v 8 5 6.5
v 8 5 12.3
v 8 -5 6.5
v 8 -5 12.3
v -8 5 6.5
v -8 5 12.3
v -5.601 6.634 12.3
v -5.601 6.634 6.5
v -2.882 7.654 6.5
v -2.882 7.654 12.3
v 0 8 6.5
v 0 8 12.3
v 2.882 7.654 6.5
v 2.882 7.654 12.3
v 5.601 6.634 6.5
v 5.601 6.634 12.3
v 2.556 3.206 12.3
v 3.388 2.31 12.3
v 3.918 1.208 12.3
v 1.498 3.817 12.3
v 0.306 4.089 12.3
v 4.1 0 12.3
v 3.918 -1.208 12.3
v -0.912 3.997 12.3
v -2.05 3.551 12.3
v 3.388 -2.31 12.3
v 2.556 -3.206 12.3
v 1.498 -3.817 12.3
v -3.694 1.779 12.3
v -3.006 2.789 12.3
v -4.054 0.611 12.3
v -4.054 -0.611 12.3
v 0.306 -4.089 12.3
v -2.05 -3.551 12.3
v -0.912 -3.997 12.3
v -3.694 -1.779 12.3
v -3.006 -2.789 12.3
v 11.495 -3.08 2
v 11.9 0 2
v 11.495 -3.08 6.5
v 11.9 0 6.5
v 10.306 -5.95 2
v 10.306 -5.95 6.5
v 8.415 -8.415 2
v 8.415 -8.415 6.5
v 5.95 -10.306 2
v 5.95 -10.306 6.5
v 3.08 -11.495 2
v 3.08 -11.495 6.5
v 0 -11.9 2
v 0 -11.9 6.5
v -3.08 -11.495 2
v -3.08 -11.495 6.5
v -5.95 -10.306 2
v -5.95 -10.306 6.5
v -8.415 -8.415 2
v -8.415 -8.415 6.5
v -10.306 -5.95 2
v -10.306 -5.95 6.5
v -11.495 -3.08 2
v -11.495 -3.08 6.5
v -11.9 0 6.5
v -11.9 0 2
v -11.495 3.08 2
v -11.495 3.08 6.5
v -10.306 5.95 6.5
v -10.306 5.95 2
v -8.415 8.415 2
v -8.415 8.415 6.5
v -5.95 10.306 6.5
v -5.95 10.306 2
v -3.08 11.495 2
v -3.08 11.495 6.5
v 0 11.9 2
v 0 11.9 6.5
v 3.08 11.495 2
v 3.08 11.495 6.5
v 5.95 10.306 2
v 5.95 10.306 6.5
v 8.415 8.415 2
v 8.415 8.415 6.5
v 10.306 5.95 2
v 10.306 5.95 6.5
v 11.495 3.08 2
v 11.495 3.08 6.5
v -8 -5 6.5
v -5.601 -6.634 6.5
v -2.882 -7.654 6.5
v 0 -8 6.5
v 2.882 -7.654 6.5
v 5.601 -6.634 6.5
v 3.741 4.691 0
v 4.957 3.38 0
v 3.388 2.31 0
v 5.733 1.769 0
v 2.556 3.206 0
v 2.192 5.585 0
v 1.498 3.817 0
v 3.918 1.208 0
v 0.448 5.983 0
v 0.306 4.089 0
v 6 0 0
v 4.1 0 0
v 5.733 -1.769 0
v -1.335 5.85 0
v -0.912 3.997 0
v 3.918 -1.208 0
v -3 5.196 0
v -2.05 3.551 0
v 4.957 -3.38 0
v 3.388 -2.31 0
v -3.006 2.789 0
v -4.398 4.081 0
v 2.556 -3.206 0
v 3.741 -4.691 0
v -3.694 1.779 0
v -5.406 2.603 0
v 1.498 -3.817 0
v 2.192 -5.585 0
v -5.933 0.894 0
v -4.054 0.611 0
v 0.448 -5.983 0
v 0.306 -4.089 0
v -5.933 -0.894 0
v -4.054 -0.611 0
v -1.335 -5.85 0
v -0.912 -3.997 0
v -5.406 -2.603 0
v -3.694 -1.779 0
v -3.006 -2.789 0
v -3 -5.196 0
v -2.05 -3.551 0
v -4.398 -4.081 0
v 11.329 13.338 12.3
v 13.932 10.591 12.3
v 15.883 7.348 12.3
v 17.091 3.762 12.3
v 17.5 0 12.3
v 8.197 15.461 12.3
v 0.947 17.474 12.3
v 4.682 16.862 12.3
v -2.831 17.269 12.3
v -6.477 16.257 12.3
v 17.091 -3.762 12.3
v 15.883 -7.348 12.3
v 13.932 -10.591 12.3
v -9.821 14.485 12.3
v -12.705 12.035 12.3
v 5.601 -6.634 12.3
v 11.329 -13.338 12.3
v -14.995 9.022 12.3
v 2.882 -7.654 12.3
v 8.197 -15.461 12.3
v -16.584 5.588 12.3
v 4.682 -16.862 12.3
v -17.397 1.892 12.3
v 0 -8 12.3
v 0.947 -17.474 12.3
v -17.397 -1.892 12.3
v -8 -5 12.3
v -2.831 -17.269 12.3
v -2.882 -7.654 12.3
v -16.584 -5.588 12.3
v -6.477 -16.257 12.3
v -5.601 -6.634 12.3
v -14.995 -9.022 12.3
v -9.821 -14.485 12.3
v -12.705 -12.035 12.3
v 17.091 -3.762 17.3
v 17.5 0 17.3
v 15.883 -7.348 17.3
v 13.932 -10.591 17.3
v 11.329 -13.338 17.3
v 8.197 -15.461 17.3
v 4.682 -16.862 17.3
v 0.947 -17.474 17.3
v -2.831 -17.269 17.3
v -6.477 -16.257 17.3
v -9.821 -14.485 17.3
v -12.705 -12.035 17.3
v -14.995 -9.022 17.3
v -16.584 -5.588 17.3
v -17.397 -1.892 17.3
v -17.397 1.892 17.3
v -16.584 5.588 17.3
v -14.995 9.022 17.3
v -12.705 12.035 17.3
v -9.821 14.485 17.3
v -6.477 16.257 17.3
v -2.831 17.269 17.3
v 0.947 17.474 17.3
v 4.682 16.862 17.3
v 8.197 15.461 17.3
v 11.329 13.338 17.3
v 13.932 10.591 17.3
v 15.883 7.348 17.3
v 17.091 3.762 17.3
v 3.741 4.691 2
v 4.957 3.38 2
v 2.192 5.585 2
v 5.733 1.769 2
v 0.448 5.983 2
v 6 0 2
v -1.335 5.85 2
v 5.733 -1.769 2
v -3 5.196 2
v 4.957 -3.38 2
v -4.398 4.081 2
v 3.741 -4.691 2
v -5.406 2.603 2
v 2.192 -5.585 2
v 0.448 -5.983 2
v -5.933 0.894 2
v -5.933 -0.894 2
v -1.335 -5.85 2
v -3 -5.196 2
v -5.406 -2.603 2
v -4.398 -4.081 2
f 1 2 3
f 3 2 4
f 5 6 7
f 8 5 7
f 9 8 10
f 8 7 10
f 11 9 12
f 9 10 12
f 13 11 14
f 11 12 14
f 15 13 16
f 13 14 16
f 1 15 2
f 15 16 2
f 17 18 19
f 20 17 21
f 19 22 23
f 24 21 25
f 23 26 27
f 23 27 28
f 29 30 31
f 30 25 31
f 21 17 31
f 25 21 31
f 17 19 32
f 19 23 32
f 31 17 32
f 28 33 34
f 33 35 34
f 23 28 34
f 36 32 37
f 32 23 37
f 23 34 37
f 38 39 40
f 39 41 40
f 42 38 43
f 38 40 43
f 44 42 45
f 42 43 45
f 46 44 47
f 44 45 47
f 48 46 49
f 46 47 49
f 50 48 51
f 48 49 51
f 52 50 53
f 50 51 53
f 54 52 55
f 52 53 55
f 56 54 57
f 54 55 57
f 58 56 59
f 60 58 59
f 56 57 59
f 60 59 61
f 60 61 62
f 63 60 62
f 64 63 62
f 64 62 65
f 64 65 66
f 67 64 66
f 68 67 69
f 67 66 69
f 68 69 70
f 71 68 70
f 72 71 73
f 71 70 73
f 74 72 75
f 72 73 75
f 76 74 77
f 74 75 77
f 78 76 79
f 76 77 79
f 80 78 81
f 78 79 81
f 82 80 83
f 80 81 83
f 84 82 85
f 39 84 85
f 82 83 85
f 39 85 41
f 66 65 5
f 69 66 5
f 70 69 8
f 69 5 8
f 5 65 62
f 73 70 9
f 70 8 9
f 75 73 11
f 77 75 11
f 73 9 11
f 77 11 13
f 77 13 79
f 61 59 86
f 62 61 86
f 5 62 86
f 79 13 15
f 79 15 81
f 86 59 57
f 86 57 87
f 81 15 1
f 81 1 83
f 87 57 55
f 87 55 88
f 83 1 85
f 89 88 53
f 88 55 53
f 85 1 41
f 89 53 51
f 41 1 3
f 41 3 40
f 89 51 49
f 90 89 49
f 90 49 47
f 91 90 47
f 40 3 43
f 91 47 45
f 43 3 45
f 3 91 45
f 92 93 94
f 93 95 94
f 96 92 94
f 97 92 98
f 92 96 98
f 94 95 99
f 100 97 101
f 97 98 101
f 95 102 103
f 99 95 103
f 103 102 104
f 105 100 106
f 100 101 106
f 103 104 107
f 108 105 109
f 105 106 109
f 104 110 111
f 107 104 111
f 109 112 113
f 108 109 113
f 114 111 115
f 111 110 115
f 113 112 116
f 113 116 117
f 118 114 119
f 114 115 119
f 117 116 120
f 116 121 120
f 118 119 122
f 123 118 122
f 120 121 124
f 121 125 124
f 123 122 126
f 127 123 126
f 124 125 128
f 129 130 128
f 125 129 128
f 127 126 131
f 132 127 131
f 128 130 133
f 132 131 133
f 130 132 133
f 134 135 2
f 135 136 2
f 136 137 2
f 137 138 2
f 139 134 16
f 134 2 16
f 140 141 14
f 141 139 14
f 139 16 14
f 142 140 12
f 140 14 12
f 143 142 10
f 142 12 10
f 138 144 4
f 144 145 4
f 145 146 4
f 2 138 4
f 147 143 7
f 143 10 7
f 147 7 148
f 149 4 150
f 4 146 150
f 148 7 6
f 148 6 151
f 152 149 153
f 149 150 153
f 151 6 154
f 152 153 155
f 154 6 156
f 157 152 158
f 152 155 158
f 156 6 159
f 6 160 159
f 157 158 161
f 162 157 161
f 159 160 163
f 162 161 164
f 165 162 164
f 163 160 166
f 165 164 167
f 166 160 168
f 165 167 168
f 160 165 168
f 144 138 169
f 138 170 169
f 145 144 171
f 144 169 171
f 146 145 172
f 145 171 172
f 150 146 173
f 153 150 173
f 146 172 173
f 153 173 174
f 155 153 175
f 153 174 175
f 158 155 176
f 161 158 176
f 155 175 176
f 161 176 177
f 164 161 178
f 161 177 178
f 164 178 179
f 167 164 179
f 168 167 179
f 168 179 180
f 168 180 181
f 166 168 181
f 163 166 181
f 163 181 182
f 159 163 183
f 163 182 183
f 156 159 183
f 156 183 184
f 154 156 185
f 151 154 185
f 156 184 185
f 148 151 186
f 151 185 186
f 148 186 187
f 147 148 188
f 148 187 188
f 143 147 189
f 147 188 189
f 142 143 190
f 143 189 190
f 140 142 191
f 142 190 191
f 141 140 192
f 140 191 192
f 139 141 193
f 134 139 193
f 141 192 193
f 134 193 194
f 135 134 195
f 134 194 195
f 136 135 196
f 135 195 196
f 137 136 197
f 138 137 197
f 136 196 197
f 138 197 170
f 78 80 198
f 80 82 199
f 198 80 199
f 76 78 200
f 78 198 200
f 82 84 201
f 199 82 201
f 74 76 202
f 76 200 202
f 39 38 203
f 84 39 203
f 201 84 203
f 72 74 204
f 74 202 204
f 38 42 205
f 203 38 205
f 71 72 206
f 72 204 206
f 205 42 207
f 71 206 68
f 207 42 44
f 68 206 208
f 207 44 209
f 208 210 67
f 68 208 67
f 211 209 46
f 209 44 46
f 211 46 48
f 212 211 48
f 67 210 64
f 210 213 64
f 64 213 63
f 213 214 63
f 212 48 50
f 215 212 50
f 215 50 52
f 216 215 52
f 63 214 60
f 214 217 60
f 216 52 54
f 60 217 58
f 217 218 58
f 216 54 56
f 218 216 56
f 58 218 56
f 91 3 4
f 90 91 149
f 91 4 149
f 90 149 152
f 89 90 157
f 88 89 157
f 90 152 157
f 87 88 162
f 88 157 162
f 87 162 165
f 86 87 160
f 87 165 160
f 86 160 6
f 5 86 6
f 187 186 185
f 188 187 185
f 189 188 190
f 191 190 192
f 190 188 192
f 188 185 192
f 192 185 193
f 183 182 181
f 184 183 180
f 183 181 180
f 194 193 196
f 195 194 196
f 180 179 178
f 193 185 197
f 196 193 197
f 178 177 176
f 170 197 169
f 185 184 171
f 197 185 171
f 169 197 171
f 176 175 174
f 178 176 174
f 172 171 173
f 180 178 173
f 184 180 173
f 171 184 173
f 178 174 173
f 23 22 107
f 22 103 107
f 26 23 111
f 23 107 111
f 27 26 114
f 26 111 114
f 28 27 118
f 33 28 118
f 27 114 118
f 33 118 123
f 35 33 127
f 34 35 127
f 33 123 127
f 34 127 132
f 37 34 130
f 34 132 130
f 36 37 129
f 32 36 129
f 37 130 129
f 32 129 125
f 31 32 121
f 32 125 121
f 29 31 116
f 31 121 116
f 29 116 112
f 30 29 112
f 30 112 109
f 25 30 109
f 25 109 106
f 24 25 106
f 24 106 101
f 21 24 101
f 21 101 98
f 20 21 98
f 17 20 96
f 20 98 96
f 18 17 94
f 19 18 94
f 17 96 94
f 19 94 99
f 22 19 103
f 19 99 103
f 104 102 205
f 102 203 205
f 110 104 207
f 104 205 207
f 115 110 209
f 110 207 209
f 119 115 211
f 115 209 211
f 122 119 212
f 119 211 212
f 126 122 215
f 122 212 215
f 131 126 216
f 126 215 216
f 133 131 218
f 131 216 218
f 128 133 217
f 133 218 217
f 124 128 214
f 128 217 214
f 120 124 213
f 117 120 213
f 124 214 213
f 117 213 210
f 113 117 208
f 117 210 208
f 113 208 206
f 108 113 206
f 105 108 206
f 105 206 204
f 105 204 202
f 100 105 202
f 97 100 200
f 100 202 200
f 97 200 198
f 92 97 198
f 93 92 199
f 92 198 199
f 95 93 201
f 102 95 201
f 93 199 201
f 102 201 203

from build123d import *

# Parameters (mm, degrees)
F0_W     = 3.9
F0_H     = 5.8
F0_W_2   = 1.9
F0_H_2   = 2
F2_R     = 4.166667
F3_DEPTH = 6


with BuildPart() as f1:
    # F0 (on Front) → F1 (revolve)
    with BuildSketch(Plane.XZ):
        Polygon((17.5, 17.3), (0, 17.3), (0, 12.3), (4.1, 12.3), (8, 12.3), (17.5, 12.3), align=None)
        with Locations((6.05, 9.4)):
            Rectangle(F0_W, F0_H)
        Polygon((8, 6.5), (4.1, 6.5), (4.1, 2), (6, 2), (11.9, 2), (11.9, 6.5), align=None)
        with Locations((5.05, 1)):
            Rectangle(F0_W_2, F0_H_2)
    revolve(axis=Axis((0, 0, 14.8), (0, 0, -1)))

    # F2 (on face) → F3 (join)
    with BuildSketch(Plane(origin=(0, 0, 12.3), x_dir=(1, 0, 0), z_dir=(0, 0, -1))):
        with BuildLine():
            ThreePointArc((-8, -5), (0, -8), (8, -5))
            Line((8, -5), (8, 5))
            ThreePointArc((8, 5), (0, 8), (-8, 5))
            Line((-8, 5), (-8, -5))
        make_face()
        Circle(F2_R, mode=Mode.SUBTRACT)
    extrude(amount=F3_DEPTH)


solid = f1.part
